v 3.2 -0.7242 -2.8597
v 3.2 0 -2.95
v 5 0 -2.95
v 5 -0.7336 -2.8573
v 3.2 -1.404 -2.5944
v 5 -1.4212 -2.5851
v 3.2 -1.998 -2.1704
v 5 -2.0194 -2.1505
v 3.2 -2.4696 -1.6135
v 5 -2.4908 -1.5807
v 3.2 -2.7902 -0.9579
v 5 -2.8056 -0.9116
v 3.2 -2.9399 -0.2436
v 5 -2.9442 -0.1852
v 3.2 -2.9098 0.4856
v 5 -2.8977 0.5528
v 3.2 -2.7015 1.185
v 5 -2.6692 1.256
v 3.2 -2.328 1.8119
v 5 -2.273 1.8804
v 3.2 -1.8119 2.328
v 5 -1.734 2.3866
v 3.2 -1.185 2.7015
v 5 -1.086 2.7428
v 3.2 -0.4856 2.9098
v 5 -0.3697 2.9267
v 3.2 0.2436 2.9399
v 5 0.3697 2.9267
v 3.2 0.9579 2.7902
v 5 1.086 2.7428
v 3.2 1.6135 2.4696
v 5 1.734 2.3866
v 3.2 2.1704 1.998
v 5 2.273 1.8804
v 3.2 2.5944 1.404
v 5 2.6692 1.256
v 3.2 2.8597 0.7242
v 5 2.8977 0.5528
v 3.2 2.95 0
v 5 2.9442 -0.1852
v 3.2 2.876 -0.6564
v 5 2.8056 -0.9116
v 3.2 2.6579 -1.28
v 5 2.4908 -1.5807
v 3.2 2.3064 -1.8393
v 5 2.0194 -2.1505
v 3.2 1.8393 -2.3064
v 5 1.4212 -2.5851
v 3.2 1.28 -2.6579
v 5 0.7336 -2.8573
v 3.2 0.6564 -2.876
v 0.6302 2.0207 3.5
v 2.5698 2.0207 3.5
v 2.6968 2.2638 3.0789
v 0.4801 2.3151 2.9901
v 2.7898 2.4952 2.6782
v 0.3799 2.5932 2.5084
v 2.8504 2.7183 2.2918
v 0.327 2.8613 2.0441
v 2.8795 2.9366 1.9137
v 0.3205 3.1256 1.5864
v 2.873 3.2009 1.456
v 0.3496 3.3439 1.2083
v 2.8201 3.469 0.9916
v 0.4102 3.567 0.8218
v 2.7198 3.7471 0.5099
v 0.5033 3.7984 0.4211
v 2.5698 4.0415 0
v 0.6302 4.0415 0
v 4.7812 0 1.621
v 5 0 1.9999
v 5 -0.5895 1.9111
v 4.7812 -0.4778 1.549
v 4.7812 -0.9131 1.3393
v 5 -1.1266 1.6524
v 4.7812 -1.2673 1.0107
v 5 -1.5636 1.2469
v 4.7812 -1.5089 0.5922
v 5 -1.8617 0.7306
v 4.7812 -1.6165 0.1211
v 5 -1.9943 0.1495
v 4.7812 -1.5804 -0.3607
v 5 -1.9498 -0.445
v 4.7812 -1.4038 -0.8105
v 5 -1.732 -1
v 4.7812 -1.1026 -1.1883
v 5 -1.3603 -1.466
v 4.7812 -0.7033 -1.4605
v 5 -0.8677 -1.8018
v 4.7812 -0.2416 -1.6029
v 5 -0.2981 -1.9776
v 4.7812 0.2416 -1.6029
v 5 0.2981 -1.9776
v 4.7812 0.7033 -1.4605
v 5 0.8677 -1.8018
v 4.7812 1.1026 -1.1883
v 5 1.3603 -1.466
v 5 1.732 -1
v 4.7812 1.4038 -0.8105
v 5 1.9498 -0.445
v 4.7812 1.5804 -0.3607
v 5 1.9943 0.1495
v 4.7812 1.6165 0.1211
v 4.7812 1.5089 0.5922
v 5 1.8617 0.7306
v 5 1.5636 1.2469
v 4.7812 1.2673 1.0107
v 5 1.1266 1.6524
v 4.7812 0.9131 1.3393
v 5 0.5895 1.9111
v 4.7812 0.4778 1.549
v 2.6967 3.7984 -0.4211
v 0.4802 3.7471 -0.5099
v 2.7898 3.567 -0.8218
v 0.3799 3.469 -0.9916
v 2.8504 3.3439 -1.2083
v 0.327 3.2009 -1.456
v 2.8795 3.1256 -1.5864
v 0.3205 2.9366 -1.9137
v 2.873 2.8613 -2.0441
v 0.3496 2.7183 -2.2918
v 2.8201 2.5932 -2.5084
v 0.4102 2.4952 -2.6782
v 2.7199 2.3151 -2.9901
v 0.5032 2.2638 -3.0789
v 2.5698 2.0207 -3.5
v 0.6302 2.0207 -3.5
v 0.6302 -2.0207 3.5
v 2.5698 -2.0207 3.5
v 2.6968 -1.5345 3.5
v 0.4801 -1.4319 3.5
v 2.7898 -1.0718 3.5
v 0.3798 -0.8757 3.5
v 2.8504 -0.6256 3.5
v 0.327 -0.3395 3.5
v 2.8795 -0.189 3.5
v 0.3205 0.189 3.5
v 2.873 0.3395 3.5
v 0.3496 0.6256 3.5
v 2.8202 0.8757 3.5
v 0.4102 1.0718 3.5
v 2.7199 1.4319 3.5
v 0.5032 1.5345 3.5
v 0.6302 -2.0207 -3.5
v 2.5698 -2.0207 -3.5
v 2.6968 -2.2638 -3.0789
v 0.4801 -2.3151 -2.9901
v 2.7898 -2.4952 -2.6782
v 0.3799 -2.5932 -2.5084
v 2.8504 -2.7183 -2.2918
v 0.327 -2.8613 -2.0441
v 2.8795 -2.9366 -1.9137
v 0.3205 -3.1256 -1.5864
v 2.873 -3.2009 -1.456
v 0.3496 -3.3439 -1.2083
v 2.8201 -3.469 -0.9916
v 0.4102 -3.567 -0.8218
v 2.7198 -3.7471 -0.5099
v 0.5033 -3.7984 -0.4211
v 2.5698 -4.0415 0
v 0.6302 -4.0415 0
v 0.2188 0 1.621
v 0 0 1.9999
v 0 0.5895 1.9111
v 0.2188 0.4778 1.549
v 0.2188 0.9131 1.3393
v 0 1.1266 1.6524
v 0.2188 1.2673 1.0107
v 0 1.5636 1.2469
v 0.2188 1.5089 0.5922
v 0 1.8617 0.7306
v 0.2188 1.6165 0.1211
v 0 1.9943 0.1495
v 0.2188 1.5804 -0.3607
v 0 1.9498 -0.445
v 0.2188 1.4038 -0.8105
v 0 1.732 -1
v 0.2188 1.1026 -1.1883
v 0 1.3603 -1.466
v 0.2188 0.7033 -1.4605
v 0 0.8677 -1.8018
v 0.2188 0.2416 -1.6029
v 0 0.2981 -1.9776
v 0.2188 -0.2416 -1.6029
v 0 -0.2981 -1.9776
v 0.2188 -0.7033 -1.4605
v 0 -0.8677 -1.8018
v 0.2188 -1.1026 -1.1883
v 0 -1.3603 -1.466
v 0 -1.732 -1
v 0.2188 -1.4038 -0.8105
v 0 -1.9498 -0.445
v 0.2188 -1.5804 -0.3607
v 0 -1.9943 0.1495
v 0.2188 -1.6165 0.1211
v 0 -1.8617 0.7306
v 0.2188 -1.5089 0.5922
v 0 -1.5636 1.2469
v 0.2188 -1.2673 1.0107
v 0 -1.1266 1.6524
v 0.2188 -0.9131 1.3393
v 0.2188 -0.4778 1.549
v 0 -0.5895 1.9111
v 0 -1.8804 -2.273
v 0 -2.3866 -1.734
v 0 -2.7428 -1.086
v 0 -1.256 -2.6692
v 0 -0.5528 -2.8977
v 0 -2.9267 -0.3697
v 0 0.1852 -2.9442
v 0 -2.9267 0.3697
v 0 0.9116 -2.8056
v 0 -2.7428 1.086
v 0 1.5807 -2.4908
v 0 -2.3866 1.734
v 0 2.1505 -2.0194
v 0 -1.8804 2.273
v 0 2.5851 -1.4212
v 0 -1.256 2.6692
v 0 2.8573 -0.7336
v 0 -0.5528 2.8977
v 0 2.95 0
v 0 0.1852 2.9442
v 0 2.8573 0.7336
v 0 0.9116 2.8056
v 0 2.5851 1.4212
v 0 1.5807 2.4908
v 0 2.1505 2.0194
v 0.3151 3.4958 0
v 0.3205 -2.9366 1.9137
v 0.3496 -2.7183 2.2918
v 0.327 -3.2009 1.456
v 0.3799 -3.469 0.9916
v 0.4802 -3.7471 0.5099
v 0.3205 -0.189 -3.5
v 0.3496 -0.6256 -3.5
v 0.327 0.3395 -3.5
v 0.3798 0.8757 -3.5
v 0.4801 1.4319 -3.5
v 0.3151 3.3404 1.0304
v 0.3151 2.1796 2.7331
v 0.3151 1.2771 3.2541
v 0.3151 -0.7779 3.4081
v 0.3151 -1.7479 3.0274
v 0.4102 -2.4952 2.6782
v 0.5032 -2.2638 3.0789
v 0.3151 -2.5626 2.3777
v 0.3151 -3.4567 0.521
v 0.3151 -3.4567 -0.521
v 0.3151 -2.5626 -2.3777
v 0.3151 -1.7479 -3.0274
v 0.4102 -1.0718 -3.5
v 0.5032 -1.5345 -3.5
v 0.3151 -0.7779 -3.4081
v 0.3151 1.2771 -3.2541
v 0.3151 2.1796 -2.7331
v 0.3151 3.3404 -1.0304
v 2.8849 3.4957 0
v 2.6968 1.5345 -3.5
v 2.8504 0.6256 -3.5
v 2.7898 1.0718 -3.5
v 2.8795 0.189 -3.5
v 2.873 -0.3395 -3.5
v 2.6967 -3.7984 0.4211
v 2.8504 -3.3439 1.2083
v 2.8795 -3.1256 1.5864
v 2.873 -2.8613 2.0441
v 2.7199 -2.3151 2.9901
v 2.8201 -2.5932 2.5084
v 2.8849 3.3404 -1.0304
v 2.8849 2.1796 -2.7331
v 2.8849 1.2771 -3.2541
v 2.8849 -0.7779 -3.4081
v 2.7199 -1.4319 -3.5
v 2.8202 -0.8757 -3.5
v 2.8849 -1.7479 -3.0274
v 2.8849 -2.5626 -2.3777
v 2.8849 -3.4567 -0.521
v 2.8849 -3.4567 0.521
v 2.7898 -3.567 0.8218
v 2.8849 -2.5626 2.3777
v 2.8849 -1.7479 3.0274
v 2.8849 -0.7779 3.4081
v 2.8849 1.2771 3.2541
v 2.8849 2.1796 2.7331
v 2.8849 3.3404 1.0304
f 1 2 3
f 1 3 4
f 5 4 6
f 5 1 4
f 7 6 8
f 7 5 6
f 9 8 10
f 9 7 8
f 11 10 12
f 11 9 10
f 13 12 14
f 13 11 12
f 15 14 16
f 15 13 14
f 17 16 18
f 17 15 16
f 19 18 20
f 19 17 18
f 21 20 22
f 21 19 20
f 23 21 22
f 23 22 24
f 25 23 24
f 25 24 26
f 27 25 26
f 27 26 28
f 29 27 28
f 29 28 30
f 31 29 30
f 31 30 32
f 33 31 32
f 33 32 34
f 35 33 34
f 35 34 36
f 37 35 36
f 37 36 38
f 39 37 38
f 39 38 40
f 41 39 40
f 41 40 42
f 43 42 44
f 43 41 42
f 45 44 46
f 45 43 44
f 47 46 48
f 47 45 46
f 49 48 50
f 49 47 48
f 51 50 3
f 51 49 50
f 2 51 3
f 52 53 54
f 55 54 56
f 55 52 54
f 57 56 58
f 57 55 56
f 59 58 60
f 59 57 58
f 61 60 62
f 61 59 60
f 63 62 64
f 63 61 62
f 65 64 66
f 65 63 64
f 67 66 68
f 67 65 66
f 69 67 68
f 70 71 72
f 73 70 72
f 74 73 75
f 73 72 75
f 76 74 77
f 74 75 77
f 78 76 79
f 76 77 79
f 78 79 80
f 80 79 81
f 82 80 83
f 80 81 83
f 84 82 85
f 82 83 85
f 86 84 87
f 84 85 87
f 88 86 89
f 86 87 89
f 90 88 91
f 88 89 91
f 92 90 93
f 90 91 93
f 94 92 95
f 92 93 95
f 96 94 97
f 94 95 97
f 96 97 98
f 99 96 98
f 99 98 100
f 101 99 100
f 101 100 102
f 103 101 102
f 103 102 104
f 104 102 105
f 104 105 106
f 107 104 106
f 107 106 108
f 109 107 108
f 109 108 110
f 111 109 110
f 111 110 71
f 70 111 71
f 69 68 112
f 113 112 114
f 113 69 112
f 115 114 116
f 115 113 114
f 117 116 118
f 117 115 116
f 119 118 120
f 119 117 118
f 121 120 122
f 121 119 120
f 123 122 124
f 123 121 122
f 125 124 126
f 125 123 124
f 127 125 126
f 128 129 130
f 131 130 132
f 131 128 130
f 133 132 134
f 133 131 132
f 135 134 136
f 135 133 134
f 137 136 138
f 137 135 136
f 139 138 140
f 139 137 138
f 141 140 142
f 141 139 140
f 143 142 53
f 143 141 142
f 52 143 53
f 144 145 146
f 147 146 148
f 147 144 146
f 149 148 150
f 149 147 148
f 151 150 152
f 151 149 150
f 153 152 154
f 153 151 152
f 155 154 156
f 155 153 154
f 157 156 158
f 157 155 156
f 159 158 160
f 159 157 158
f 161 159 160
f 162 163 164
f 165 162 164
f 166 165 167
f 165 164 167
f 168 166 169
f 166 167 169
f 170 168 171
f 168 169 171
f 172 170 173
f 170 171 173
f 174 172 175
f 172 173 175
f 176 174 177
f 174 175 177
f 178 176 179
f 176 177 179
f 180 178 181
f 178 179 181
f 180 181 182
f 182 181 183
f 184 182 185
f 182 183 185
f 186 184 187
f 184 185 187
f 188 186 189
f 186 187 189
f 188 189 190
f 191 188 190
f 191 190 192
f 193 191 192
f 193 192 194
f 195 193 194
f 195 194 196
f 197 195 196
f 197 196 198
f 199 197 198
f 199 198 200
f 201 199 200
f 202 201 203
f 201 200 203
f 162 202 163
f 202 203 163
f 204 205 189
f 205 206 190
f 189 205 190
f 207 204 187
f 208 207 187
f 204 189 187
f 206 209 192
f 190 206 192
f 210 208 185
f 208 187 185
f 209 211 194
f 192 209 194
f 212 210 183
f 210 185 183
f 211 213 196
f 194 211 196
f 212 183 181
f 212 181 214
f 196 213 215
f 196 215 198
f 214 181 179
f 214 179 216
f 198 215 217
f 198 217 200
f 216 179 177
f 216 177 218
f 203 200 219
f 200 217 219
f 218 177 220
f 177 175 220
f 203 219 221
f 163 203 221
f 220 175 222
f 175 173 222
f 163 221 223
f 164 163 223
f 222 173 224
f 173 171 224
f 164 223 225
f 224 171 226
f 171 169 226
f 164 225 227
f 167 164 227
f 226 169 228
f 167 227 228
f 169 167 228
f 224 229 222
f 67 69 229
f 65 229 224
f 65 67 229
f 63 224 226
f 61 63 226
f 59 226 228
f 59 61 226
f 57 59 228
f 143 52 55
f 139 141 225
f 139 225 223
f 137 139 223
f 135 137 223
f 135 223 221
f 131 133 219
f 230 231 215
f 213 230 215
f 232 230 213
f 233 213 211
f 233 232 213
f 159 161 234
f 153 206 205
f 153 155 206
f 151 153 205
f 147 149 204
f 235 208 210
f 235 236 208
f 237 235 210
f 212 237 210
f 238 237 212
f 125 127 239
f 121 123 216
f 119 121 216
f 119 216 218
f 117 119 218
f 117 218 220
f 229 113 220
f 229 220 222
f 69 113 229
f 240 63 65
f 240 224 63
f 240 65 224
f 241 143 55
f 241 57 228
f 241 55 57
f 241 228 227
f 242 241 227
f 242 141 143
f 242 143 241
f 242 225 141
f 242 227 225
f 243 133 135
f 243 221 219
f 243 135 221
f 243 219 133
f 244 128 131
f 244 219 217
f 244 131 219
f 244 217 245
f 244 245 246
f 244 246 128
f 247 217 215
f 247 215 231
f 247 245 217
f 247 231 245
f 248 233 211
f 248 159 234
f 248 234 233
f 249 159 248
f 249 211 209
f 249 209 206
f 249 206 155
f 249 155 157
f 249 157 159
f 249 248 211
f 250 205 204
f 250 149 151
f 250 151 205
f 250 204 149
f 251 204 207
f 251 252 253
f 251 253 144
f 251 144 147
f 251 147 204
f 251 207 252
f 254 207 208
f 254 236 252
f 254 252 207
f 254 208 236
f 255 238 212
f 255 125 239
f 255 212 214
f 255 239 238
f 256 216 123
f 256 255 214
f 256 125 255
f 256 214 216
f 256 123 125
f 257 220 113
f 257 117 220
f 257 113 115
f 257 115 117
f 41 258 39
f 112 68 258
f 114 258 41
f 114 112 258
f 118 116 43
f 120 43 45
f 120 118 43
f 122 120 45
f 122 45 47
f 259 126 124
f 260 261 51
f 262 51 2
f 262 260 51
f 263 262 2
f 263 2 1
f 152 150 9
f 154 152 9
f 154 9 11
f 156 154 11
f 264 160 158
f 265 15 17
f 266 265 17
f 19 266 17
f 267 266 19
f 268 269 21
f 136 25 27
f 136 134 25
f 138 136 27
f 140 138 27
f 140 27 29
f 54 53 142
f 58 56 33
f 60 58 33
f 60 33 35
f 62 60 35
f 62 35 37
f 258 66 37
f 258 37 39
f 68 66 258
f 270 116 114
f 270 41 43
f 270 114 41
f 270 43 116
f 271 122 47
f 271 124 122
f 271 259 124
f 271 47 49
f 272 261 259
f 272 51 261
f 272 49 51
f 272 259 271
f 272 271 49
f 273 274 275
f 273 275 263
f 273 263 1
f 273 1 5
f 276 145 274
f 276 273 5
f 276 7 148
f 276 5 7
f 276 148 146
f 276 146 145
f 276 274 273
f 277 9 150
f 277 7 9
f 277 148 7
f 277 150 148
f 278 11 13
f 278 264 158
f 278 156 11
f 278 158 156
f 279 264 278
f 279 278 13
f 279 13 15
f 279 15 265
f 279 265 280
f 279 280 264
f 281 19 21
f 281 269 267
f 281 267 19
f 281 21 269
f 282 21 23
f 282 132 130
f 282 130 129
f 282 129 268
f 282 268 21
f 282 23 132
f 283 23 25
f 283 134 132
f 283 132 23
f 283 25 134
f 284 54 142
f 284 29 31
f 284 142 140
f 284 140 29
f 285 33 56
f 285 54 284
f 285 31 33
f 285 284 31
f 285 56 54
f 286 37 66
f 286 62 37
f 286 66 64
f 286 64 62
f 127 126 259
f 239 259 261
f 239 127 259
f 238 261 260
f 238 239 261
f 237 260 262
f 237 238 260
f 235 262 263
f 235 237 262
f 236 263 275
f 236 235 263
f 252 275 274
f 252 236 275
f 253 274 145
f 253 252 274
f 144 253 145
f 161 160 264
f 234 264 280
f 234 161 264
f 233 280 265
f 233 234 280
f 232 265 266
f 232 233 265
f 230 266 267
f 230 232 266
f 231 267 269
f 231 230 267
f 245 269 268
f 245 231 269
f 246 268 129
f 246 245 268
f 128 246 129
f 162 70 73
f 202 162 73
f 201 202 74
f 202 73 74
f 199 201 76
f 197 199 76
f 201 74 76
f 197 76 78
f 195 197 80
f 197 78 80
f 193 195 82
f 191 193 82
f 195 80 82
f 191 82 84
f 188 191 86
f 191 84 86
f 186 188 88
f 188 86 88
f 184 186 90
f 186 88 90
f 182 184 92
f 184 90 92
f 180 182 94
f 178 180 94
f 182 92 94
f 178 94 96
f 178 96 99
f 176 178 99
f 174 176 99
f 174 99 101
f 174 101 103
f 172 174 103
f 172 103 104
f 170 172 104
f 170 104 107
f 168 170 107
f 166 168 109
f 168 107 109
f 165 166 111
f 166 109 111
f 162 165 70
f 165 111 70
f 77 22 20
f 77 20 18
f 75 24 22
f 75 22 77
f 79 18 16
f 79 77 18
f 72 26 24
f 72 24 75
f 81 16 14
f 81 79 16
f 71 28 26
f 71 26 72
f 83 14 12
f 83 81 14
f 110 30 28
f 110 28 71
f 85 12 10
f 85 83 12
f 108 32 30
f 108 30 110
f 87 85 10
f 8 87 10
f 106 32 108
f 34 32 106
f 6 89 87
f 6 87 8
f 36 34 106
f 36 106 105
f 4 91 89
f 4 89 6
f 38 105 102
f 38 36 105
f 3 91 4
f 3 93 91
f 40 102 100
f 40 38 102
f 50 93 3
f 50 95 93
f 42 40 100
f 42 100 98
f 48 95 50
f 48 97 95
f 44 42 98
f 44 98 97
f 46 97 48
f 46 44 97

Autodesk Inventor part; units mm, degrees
ref_plane "YZ Plane" through (0, 0, 0) normal (1, 0, 0) x (0, 1, 0)
ref_plane "XZ Plane" through (0, 0, 0) normal (0, 1, 0) x (-1, 0, 0)
sketch "Sketch1" plane through (0, 0, 0) normal (1, 0, 0) x (0, 1, 0)
  line L0 (2.0207, -3.5) -> (-2.0207, -3.5)
  line L1 (-2.0207, -3.5) -> (-4.0415, 0)
  line L2 (-4.0415, 0) -> (-2.0207, 3.5)
  line L3 (-2.0207, 3.5) -> (2.0207, 3.5)
  line L4 (2.0207, 3.5) -> (4.0415, 0)
  line L5 (4.0415, 0) -> (2.0207, -3.5)
  point P0 (0, 0)
  point P1 (0, 0)
  dimension "d0" = 8.0829
extrude "Body" add sketch "Sketch1" along normal blind 3.2
sketch "Sketch2" plane through (3.2, 0, 0) normal (1, 0, 0) x (0, 0, -1)
  circle A0 centre (0, 0) radius 2.95
  dimension "d7" = 5.9
extrude "Ring" add sketch "Sketch2" along normal blind 1.8
sketch "Sketch3" plane through (0, 0, 0) normal (0, 0, 1) x (1, 0, 0)
  line L0 (0, 2.0207) -> (0, 4.0415) projected
  line L1 (0, 4.0415) -> (3.2, 4.0415) projected
  line L2 (3.2, 2.0207) -> (3.2, 4.0415) projected
  line L3 (-0.64, 0) -> (3.84, 0) projected
  line L4 (0, 2.95) -> (0.6302, 4.0415)
  line L5 (2.5698, 4.0415) -> (3.2, 2.95)
  dimension "d3" = 30
  dimension "d4" = 30
  dimension "d5" = 5.9
  dimension "d6" = 5.9
revolve "Chamfer1" cut sketch "Sketch3" angle 360 about axis through (-10, 0, 0) along (1, 0, 0)
sketch "Sketch4" plane through (0, 0, 0) normal (-1, 0, 0) x (0, 0, 1)
  line L0 (0, -5.658) -> (0, 5.658) projected
  line L1 (-4.9, 0) -> (4.9, 0) projected
  point P0 (0, 0)
hole "Thread" at (0, 0, 0) direction (1, 0, 0) diameter 3.242 end through all thread size "M4x0.7" class "6H" standard "ISO Metric profile"
chamfer "Chamfer2" distance 0.3789 angle 30 1 edges at (0, 0, -1.621) measured on face at (0, 2.4745, -0.3005)
chamfer "Chamfer3" distance 0.3789 angle 30 1 edges at (5, 0, -1.621) measured on face at (5, -0.3646, -2.4627)
ref_plane "Work Plane1" through (11.804, 0, 0) normal (0, 0, 1) x (-1, 0, 0)
equation "\"d0\" = 1.1547 * SW"
equation "\"d1\" = KOH1"
equation "\"d7\" = SD2"
equation "\"d8\" = KOH - KOH1"
equation "\"d3\" = ANG1"
equation "\"d4\" = ANG2"
equation "\"d5\" = SW0"
equation "\"d6\" = SW01"
equation "\"d10\" = -0.5 * GD1 + 0.5 * NND"
equation "\"d46\" = -0.5 * GD1 + 0.5 * NND"
equation "\"d12\" = -0.5 * GD1 + 0.5 * NND"
equation "\"d47\" = -0.5 * GD1 + 0.5 * NND"
equation "\"ANG1\" = 30deg"
equation "\"ANG2\" = 30deg"
equation "\"NND\" = 4"
equation "\"KOH1\" = 3.2"
equation "\"KOH\" = 5"
equation "\"SW\" = 7"
equation "\"SW0\" = 5.9"
equation "\"SW01\" = SW0"
equation "\"SD2\" = SW0"
equation "\"GUL\" = 0.541266 * PTC"
equation "\"THREADDIA\" = 4"
equation "\"TOA\" = 30deg"
equation "\"PTC\" = 0.7"
equation "\"E0\" = 1.155 * SW"
equation "\"GAL\" = 0.541266 * PTC"
equation "\"GD1\" = 3.242228"
properties part number "M4 - Nyloc Nut" material "Steel, Alloy"
